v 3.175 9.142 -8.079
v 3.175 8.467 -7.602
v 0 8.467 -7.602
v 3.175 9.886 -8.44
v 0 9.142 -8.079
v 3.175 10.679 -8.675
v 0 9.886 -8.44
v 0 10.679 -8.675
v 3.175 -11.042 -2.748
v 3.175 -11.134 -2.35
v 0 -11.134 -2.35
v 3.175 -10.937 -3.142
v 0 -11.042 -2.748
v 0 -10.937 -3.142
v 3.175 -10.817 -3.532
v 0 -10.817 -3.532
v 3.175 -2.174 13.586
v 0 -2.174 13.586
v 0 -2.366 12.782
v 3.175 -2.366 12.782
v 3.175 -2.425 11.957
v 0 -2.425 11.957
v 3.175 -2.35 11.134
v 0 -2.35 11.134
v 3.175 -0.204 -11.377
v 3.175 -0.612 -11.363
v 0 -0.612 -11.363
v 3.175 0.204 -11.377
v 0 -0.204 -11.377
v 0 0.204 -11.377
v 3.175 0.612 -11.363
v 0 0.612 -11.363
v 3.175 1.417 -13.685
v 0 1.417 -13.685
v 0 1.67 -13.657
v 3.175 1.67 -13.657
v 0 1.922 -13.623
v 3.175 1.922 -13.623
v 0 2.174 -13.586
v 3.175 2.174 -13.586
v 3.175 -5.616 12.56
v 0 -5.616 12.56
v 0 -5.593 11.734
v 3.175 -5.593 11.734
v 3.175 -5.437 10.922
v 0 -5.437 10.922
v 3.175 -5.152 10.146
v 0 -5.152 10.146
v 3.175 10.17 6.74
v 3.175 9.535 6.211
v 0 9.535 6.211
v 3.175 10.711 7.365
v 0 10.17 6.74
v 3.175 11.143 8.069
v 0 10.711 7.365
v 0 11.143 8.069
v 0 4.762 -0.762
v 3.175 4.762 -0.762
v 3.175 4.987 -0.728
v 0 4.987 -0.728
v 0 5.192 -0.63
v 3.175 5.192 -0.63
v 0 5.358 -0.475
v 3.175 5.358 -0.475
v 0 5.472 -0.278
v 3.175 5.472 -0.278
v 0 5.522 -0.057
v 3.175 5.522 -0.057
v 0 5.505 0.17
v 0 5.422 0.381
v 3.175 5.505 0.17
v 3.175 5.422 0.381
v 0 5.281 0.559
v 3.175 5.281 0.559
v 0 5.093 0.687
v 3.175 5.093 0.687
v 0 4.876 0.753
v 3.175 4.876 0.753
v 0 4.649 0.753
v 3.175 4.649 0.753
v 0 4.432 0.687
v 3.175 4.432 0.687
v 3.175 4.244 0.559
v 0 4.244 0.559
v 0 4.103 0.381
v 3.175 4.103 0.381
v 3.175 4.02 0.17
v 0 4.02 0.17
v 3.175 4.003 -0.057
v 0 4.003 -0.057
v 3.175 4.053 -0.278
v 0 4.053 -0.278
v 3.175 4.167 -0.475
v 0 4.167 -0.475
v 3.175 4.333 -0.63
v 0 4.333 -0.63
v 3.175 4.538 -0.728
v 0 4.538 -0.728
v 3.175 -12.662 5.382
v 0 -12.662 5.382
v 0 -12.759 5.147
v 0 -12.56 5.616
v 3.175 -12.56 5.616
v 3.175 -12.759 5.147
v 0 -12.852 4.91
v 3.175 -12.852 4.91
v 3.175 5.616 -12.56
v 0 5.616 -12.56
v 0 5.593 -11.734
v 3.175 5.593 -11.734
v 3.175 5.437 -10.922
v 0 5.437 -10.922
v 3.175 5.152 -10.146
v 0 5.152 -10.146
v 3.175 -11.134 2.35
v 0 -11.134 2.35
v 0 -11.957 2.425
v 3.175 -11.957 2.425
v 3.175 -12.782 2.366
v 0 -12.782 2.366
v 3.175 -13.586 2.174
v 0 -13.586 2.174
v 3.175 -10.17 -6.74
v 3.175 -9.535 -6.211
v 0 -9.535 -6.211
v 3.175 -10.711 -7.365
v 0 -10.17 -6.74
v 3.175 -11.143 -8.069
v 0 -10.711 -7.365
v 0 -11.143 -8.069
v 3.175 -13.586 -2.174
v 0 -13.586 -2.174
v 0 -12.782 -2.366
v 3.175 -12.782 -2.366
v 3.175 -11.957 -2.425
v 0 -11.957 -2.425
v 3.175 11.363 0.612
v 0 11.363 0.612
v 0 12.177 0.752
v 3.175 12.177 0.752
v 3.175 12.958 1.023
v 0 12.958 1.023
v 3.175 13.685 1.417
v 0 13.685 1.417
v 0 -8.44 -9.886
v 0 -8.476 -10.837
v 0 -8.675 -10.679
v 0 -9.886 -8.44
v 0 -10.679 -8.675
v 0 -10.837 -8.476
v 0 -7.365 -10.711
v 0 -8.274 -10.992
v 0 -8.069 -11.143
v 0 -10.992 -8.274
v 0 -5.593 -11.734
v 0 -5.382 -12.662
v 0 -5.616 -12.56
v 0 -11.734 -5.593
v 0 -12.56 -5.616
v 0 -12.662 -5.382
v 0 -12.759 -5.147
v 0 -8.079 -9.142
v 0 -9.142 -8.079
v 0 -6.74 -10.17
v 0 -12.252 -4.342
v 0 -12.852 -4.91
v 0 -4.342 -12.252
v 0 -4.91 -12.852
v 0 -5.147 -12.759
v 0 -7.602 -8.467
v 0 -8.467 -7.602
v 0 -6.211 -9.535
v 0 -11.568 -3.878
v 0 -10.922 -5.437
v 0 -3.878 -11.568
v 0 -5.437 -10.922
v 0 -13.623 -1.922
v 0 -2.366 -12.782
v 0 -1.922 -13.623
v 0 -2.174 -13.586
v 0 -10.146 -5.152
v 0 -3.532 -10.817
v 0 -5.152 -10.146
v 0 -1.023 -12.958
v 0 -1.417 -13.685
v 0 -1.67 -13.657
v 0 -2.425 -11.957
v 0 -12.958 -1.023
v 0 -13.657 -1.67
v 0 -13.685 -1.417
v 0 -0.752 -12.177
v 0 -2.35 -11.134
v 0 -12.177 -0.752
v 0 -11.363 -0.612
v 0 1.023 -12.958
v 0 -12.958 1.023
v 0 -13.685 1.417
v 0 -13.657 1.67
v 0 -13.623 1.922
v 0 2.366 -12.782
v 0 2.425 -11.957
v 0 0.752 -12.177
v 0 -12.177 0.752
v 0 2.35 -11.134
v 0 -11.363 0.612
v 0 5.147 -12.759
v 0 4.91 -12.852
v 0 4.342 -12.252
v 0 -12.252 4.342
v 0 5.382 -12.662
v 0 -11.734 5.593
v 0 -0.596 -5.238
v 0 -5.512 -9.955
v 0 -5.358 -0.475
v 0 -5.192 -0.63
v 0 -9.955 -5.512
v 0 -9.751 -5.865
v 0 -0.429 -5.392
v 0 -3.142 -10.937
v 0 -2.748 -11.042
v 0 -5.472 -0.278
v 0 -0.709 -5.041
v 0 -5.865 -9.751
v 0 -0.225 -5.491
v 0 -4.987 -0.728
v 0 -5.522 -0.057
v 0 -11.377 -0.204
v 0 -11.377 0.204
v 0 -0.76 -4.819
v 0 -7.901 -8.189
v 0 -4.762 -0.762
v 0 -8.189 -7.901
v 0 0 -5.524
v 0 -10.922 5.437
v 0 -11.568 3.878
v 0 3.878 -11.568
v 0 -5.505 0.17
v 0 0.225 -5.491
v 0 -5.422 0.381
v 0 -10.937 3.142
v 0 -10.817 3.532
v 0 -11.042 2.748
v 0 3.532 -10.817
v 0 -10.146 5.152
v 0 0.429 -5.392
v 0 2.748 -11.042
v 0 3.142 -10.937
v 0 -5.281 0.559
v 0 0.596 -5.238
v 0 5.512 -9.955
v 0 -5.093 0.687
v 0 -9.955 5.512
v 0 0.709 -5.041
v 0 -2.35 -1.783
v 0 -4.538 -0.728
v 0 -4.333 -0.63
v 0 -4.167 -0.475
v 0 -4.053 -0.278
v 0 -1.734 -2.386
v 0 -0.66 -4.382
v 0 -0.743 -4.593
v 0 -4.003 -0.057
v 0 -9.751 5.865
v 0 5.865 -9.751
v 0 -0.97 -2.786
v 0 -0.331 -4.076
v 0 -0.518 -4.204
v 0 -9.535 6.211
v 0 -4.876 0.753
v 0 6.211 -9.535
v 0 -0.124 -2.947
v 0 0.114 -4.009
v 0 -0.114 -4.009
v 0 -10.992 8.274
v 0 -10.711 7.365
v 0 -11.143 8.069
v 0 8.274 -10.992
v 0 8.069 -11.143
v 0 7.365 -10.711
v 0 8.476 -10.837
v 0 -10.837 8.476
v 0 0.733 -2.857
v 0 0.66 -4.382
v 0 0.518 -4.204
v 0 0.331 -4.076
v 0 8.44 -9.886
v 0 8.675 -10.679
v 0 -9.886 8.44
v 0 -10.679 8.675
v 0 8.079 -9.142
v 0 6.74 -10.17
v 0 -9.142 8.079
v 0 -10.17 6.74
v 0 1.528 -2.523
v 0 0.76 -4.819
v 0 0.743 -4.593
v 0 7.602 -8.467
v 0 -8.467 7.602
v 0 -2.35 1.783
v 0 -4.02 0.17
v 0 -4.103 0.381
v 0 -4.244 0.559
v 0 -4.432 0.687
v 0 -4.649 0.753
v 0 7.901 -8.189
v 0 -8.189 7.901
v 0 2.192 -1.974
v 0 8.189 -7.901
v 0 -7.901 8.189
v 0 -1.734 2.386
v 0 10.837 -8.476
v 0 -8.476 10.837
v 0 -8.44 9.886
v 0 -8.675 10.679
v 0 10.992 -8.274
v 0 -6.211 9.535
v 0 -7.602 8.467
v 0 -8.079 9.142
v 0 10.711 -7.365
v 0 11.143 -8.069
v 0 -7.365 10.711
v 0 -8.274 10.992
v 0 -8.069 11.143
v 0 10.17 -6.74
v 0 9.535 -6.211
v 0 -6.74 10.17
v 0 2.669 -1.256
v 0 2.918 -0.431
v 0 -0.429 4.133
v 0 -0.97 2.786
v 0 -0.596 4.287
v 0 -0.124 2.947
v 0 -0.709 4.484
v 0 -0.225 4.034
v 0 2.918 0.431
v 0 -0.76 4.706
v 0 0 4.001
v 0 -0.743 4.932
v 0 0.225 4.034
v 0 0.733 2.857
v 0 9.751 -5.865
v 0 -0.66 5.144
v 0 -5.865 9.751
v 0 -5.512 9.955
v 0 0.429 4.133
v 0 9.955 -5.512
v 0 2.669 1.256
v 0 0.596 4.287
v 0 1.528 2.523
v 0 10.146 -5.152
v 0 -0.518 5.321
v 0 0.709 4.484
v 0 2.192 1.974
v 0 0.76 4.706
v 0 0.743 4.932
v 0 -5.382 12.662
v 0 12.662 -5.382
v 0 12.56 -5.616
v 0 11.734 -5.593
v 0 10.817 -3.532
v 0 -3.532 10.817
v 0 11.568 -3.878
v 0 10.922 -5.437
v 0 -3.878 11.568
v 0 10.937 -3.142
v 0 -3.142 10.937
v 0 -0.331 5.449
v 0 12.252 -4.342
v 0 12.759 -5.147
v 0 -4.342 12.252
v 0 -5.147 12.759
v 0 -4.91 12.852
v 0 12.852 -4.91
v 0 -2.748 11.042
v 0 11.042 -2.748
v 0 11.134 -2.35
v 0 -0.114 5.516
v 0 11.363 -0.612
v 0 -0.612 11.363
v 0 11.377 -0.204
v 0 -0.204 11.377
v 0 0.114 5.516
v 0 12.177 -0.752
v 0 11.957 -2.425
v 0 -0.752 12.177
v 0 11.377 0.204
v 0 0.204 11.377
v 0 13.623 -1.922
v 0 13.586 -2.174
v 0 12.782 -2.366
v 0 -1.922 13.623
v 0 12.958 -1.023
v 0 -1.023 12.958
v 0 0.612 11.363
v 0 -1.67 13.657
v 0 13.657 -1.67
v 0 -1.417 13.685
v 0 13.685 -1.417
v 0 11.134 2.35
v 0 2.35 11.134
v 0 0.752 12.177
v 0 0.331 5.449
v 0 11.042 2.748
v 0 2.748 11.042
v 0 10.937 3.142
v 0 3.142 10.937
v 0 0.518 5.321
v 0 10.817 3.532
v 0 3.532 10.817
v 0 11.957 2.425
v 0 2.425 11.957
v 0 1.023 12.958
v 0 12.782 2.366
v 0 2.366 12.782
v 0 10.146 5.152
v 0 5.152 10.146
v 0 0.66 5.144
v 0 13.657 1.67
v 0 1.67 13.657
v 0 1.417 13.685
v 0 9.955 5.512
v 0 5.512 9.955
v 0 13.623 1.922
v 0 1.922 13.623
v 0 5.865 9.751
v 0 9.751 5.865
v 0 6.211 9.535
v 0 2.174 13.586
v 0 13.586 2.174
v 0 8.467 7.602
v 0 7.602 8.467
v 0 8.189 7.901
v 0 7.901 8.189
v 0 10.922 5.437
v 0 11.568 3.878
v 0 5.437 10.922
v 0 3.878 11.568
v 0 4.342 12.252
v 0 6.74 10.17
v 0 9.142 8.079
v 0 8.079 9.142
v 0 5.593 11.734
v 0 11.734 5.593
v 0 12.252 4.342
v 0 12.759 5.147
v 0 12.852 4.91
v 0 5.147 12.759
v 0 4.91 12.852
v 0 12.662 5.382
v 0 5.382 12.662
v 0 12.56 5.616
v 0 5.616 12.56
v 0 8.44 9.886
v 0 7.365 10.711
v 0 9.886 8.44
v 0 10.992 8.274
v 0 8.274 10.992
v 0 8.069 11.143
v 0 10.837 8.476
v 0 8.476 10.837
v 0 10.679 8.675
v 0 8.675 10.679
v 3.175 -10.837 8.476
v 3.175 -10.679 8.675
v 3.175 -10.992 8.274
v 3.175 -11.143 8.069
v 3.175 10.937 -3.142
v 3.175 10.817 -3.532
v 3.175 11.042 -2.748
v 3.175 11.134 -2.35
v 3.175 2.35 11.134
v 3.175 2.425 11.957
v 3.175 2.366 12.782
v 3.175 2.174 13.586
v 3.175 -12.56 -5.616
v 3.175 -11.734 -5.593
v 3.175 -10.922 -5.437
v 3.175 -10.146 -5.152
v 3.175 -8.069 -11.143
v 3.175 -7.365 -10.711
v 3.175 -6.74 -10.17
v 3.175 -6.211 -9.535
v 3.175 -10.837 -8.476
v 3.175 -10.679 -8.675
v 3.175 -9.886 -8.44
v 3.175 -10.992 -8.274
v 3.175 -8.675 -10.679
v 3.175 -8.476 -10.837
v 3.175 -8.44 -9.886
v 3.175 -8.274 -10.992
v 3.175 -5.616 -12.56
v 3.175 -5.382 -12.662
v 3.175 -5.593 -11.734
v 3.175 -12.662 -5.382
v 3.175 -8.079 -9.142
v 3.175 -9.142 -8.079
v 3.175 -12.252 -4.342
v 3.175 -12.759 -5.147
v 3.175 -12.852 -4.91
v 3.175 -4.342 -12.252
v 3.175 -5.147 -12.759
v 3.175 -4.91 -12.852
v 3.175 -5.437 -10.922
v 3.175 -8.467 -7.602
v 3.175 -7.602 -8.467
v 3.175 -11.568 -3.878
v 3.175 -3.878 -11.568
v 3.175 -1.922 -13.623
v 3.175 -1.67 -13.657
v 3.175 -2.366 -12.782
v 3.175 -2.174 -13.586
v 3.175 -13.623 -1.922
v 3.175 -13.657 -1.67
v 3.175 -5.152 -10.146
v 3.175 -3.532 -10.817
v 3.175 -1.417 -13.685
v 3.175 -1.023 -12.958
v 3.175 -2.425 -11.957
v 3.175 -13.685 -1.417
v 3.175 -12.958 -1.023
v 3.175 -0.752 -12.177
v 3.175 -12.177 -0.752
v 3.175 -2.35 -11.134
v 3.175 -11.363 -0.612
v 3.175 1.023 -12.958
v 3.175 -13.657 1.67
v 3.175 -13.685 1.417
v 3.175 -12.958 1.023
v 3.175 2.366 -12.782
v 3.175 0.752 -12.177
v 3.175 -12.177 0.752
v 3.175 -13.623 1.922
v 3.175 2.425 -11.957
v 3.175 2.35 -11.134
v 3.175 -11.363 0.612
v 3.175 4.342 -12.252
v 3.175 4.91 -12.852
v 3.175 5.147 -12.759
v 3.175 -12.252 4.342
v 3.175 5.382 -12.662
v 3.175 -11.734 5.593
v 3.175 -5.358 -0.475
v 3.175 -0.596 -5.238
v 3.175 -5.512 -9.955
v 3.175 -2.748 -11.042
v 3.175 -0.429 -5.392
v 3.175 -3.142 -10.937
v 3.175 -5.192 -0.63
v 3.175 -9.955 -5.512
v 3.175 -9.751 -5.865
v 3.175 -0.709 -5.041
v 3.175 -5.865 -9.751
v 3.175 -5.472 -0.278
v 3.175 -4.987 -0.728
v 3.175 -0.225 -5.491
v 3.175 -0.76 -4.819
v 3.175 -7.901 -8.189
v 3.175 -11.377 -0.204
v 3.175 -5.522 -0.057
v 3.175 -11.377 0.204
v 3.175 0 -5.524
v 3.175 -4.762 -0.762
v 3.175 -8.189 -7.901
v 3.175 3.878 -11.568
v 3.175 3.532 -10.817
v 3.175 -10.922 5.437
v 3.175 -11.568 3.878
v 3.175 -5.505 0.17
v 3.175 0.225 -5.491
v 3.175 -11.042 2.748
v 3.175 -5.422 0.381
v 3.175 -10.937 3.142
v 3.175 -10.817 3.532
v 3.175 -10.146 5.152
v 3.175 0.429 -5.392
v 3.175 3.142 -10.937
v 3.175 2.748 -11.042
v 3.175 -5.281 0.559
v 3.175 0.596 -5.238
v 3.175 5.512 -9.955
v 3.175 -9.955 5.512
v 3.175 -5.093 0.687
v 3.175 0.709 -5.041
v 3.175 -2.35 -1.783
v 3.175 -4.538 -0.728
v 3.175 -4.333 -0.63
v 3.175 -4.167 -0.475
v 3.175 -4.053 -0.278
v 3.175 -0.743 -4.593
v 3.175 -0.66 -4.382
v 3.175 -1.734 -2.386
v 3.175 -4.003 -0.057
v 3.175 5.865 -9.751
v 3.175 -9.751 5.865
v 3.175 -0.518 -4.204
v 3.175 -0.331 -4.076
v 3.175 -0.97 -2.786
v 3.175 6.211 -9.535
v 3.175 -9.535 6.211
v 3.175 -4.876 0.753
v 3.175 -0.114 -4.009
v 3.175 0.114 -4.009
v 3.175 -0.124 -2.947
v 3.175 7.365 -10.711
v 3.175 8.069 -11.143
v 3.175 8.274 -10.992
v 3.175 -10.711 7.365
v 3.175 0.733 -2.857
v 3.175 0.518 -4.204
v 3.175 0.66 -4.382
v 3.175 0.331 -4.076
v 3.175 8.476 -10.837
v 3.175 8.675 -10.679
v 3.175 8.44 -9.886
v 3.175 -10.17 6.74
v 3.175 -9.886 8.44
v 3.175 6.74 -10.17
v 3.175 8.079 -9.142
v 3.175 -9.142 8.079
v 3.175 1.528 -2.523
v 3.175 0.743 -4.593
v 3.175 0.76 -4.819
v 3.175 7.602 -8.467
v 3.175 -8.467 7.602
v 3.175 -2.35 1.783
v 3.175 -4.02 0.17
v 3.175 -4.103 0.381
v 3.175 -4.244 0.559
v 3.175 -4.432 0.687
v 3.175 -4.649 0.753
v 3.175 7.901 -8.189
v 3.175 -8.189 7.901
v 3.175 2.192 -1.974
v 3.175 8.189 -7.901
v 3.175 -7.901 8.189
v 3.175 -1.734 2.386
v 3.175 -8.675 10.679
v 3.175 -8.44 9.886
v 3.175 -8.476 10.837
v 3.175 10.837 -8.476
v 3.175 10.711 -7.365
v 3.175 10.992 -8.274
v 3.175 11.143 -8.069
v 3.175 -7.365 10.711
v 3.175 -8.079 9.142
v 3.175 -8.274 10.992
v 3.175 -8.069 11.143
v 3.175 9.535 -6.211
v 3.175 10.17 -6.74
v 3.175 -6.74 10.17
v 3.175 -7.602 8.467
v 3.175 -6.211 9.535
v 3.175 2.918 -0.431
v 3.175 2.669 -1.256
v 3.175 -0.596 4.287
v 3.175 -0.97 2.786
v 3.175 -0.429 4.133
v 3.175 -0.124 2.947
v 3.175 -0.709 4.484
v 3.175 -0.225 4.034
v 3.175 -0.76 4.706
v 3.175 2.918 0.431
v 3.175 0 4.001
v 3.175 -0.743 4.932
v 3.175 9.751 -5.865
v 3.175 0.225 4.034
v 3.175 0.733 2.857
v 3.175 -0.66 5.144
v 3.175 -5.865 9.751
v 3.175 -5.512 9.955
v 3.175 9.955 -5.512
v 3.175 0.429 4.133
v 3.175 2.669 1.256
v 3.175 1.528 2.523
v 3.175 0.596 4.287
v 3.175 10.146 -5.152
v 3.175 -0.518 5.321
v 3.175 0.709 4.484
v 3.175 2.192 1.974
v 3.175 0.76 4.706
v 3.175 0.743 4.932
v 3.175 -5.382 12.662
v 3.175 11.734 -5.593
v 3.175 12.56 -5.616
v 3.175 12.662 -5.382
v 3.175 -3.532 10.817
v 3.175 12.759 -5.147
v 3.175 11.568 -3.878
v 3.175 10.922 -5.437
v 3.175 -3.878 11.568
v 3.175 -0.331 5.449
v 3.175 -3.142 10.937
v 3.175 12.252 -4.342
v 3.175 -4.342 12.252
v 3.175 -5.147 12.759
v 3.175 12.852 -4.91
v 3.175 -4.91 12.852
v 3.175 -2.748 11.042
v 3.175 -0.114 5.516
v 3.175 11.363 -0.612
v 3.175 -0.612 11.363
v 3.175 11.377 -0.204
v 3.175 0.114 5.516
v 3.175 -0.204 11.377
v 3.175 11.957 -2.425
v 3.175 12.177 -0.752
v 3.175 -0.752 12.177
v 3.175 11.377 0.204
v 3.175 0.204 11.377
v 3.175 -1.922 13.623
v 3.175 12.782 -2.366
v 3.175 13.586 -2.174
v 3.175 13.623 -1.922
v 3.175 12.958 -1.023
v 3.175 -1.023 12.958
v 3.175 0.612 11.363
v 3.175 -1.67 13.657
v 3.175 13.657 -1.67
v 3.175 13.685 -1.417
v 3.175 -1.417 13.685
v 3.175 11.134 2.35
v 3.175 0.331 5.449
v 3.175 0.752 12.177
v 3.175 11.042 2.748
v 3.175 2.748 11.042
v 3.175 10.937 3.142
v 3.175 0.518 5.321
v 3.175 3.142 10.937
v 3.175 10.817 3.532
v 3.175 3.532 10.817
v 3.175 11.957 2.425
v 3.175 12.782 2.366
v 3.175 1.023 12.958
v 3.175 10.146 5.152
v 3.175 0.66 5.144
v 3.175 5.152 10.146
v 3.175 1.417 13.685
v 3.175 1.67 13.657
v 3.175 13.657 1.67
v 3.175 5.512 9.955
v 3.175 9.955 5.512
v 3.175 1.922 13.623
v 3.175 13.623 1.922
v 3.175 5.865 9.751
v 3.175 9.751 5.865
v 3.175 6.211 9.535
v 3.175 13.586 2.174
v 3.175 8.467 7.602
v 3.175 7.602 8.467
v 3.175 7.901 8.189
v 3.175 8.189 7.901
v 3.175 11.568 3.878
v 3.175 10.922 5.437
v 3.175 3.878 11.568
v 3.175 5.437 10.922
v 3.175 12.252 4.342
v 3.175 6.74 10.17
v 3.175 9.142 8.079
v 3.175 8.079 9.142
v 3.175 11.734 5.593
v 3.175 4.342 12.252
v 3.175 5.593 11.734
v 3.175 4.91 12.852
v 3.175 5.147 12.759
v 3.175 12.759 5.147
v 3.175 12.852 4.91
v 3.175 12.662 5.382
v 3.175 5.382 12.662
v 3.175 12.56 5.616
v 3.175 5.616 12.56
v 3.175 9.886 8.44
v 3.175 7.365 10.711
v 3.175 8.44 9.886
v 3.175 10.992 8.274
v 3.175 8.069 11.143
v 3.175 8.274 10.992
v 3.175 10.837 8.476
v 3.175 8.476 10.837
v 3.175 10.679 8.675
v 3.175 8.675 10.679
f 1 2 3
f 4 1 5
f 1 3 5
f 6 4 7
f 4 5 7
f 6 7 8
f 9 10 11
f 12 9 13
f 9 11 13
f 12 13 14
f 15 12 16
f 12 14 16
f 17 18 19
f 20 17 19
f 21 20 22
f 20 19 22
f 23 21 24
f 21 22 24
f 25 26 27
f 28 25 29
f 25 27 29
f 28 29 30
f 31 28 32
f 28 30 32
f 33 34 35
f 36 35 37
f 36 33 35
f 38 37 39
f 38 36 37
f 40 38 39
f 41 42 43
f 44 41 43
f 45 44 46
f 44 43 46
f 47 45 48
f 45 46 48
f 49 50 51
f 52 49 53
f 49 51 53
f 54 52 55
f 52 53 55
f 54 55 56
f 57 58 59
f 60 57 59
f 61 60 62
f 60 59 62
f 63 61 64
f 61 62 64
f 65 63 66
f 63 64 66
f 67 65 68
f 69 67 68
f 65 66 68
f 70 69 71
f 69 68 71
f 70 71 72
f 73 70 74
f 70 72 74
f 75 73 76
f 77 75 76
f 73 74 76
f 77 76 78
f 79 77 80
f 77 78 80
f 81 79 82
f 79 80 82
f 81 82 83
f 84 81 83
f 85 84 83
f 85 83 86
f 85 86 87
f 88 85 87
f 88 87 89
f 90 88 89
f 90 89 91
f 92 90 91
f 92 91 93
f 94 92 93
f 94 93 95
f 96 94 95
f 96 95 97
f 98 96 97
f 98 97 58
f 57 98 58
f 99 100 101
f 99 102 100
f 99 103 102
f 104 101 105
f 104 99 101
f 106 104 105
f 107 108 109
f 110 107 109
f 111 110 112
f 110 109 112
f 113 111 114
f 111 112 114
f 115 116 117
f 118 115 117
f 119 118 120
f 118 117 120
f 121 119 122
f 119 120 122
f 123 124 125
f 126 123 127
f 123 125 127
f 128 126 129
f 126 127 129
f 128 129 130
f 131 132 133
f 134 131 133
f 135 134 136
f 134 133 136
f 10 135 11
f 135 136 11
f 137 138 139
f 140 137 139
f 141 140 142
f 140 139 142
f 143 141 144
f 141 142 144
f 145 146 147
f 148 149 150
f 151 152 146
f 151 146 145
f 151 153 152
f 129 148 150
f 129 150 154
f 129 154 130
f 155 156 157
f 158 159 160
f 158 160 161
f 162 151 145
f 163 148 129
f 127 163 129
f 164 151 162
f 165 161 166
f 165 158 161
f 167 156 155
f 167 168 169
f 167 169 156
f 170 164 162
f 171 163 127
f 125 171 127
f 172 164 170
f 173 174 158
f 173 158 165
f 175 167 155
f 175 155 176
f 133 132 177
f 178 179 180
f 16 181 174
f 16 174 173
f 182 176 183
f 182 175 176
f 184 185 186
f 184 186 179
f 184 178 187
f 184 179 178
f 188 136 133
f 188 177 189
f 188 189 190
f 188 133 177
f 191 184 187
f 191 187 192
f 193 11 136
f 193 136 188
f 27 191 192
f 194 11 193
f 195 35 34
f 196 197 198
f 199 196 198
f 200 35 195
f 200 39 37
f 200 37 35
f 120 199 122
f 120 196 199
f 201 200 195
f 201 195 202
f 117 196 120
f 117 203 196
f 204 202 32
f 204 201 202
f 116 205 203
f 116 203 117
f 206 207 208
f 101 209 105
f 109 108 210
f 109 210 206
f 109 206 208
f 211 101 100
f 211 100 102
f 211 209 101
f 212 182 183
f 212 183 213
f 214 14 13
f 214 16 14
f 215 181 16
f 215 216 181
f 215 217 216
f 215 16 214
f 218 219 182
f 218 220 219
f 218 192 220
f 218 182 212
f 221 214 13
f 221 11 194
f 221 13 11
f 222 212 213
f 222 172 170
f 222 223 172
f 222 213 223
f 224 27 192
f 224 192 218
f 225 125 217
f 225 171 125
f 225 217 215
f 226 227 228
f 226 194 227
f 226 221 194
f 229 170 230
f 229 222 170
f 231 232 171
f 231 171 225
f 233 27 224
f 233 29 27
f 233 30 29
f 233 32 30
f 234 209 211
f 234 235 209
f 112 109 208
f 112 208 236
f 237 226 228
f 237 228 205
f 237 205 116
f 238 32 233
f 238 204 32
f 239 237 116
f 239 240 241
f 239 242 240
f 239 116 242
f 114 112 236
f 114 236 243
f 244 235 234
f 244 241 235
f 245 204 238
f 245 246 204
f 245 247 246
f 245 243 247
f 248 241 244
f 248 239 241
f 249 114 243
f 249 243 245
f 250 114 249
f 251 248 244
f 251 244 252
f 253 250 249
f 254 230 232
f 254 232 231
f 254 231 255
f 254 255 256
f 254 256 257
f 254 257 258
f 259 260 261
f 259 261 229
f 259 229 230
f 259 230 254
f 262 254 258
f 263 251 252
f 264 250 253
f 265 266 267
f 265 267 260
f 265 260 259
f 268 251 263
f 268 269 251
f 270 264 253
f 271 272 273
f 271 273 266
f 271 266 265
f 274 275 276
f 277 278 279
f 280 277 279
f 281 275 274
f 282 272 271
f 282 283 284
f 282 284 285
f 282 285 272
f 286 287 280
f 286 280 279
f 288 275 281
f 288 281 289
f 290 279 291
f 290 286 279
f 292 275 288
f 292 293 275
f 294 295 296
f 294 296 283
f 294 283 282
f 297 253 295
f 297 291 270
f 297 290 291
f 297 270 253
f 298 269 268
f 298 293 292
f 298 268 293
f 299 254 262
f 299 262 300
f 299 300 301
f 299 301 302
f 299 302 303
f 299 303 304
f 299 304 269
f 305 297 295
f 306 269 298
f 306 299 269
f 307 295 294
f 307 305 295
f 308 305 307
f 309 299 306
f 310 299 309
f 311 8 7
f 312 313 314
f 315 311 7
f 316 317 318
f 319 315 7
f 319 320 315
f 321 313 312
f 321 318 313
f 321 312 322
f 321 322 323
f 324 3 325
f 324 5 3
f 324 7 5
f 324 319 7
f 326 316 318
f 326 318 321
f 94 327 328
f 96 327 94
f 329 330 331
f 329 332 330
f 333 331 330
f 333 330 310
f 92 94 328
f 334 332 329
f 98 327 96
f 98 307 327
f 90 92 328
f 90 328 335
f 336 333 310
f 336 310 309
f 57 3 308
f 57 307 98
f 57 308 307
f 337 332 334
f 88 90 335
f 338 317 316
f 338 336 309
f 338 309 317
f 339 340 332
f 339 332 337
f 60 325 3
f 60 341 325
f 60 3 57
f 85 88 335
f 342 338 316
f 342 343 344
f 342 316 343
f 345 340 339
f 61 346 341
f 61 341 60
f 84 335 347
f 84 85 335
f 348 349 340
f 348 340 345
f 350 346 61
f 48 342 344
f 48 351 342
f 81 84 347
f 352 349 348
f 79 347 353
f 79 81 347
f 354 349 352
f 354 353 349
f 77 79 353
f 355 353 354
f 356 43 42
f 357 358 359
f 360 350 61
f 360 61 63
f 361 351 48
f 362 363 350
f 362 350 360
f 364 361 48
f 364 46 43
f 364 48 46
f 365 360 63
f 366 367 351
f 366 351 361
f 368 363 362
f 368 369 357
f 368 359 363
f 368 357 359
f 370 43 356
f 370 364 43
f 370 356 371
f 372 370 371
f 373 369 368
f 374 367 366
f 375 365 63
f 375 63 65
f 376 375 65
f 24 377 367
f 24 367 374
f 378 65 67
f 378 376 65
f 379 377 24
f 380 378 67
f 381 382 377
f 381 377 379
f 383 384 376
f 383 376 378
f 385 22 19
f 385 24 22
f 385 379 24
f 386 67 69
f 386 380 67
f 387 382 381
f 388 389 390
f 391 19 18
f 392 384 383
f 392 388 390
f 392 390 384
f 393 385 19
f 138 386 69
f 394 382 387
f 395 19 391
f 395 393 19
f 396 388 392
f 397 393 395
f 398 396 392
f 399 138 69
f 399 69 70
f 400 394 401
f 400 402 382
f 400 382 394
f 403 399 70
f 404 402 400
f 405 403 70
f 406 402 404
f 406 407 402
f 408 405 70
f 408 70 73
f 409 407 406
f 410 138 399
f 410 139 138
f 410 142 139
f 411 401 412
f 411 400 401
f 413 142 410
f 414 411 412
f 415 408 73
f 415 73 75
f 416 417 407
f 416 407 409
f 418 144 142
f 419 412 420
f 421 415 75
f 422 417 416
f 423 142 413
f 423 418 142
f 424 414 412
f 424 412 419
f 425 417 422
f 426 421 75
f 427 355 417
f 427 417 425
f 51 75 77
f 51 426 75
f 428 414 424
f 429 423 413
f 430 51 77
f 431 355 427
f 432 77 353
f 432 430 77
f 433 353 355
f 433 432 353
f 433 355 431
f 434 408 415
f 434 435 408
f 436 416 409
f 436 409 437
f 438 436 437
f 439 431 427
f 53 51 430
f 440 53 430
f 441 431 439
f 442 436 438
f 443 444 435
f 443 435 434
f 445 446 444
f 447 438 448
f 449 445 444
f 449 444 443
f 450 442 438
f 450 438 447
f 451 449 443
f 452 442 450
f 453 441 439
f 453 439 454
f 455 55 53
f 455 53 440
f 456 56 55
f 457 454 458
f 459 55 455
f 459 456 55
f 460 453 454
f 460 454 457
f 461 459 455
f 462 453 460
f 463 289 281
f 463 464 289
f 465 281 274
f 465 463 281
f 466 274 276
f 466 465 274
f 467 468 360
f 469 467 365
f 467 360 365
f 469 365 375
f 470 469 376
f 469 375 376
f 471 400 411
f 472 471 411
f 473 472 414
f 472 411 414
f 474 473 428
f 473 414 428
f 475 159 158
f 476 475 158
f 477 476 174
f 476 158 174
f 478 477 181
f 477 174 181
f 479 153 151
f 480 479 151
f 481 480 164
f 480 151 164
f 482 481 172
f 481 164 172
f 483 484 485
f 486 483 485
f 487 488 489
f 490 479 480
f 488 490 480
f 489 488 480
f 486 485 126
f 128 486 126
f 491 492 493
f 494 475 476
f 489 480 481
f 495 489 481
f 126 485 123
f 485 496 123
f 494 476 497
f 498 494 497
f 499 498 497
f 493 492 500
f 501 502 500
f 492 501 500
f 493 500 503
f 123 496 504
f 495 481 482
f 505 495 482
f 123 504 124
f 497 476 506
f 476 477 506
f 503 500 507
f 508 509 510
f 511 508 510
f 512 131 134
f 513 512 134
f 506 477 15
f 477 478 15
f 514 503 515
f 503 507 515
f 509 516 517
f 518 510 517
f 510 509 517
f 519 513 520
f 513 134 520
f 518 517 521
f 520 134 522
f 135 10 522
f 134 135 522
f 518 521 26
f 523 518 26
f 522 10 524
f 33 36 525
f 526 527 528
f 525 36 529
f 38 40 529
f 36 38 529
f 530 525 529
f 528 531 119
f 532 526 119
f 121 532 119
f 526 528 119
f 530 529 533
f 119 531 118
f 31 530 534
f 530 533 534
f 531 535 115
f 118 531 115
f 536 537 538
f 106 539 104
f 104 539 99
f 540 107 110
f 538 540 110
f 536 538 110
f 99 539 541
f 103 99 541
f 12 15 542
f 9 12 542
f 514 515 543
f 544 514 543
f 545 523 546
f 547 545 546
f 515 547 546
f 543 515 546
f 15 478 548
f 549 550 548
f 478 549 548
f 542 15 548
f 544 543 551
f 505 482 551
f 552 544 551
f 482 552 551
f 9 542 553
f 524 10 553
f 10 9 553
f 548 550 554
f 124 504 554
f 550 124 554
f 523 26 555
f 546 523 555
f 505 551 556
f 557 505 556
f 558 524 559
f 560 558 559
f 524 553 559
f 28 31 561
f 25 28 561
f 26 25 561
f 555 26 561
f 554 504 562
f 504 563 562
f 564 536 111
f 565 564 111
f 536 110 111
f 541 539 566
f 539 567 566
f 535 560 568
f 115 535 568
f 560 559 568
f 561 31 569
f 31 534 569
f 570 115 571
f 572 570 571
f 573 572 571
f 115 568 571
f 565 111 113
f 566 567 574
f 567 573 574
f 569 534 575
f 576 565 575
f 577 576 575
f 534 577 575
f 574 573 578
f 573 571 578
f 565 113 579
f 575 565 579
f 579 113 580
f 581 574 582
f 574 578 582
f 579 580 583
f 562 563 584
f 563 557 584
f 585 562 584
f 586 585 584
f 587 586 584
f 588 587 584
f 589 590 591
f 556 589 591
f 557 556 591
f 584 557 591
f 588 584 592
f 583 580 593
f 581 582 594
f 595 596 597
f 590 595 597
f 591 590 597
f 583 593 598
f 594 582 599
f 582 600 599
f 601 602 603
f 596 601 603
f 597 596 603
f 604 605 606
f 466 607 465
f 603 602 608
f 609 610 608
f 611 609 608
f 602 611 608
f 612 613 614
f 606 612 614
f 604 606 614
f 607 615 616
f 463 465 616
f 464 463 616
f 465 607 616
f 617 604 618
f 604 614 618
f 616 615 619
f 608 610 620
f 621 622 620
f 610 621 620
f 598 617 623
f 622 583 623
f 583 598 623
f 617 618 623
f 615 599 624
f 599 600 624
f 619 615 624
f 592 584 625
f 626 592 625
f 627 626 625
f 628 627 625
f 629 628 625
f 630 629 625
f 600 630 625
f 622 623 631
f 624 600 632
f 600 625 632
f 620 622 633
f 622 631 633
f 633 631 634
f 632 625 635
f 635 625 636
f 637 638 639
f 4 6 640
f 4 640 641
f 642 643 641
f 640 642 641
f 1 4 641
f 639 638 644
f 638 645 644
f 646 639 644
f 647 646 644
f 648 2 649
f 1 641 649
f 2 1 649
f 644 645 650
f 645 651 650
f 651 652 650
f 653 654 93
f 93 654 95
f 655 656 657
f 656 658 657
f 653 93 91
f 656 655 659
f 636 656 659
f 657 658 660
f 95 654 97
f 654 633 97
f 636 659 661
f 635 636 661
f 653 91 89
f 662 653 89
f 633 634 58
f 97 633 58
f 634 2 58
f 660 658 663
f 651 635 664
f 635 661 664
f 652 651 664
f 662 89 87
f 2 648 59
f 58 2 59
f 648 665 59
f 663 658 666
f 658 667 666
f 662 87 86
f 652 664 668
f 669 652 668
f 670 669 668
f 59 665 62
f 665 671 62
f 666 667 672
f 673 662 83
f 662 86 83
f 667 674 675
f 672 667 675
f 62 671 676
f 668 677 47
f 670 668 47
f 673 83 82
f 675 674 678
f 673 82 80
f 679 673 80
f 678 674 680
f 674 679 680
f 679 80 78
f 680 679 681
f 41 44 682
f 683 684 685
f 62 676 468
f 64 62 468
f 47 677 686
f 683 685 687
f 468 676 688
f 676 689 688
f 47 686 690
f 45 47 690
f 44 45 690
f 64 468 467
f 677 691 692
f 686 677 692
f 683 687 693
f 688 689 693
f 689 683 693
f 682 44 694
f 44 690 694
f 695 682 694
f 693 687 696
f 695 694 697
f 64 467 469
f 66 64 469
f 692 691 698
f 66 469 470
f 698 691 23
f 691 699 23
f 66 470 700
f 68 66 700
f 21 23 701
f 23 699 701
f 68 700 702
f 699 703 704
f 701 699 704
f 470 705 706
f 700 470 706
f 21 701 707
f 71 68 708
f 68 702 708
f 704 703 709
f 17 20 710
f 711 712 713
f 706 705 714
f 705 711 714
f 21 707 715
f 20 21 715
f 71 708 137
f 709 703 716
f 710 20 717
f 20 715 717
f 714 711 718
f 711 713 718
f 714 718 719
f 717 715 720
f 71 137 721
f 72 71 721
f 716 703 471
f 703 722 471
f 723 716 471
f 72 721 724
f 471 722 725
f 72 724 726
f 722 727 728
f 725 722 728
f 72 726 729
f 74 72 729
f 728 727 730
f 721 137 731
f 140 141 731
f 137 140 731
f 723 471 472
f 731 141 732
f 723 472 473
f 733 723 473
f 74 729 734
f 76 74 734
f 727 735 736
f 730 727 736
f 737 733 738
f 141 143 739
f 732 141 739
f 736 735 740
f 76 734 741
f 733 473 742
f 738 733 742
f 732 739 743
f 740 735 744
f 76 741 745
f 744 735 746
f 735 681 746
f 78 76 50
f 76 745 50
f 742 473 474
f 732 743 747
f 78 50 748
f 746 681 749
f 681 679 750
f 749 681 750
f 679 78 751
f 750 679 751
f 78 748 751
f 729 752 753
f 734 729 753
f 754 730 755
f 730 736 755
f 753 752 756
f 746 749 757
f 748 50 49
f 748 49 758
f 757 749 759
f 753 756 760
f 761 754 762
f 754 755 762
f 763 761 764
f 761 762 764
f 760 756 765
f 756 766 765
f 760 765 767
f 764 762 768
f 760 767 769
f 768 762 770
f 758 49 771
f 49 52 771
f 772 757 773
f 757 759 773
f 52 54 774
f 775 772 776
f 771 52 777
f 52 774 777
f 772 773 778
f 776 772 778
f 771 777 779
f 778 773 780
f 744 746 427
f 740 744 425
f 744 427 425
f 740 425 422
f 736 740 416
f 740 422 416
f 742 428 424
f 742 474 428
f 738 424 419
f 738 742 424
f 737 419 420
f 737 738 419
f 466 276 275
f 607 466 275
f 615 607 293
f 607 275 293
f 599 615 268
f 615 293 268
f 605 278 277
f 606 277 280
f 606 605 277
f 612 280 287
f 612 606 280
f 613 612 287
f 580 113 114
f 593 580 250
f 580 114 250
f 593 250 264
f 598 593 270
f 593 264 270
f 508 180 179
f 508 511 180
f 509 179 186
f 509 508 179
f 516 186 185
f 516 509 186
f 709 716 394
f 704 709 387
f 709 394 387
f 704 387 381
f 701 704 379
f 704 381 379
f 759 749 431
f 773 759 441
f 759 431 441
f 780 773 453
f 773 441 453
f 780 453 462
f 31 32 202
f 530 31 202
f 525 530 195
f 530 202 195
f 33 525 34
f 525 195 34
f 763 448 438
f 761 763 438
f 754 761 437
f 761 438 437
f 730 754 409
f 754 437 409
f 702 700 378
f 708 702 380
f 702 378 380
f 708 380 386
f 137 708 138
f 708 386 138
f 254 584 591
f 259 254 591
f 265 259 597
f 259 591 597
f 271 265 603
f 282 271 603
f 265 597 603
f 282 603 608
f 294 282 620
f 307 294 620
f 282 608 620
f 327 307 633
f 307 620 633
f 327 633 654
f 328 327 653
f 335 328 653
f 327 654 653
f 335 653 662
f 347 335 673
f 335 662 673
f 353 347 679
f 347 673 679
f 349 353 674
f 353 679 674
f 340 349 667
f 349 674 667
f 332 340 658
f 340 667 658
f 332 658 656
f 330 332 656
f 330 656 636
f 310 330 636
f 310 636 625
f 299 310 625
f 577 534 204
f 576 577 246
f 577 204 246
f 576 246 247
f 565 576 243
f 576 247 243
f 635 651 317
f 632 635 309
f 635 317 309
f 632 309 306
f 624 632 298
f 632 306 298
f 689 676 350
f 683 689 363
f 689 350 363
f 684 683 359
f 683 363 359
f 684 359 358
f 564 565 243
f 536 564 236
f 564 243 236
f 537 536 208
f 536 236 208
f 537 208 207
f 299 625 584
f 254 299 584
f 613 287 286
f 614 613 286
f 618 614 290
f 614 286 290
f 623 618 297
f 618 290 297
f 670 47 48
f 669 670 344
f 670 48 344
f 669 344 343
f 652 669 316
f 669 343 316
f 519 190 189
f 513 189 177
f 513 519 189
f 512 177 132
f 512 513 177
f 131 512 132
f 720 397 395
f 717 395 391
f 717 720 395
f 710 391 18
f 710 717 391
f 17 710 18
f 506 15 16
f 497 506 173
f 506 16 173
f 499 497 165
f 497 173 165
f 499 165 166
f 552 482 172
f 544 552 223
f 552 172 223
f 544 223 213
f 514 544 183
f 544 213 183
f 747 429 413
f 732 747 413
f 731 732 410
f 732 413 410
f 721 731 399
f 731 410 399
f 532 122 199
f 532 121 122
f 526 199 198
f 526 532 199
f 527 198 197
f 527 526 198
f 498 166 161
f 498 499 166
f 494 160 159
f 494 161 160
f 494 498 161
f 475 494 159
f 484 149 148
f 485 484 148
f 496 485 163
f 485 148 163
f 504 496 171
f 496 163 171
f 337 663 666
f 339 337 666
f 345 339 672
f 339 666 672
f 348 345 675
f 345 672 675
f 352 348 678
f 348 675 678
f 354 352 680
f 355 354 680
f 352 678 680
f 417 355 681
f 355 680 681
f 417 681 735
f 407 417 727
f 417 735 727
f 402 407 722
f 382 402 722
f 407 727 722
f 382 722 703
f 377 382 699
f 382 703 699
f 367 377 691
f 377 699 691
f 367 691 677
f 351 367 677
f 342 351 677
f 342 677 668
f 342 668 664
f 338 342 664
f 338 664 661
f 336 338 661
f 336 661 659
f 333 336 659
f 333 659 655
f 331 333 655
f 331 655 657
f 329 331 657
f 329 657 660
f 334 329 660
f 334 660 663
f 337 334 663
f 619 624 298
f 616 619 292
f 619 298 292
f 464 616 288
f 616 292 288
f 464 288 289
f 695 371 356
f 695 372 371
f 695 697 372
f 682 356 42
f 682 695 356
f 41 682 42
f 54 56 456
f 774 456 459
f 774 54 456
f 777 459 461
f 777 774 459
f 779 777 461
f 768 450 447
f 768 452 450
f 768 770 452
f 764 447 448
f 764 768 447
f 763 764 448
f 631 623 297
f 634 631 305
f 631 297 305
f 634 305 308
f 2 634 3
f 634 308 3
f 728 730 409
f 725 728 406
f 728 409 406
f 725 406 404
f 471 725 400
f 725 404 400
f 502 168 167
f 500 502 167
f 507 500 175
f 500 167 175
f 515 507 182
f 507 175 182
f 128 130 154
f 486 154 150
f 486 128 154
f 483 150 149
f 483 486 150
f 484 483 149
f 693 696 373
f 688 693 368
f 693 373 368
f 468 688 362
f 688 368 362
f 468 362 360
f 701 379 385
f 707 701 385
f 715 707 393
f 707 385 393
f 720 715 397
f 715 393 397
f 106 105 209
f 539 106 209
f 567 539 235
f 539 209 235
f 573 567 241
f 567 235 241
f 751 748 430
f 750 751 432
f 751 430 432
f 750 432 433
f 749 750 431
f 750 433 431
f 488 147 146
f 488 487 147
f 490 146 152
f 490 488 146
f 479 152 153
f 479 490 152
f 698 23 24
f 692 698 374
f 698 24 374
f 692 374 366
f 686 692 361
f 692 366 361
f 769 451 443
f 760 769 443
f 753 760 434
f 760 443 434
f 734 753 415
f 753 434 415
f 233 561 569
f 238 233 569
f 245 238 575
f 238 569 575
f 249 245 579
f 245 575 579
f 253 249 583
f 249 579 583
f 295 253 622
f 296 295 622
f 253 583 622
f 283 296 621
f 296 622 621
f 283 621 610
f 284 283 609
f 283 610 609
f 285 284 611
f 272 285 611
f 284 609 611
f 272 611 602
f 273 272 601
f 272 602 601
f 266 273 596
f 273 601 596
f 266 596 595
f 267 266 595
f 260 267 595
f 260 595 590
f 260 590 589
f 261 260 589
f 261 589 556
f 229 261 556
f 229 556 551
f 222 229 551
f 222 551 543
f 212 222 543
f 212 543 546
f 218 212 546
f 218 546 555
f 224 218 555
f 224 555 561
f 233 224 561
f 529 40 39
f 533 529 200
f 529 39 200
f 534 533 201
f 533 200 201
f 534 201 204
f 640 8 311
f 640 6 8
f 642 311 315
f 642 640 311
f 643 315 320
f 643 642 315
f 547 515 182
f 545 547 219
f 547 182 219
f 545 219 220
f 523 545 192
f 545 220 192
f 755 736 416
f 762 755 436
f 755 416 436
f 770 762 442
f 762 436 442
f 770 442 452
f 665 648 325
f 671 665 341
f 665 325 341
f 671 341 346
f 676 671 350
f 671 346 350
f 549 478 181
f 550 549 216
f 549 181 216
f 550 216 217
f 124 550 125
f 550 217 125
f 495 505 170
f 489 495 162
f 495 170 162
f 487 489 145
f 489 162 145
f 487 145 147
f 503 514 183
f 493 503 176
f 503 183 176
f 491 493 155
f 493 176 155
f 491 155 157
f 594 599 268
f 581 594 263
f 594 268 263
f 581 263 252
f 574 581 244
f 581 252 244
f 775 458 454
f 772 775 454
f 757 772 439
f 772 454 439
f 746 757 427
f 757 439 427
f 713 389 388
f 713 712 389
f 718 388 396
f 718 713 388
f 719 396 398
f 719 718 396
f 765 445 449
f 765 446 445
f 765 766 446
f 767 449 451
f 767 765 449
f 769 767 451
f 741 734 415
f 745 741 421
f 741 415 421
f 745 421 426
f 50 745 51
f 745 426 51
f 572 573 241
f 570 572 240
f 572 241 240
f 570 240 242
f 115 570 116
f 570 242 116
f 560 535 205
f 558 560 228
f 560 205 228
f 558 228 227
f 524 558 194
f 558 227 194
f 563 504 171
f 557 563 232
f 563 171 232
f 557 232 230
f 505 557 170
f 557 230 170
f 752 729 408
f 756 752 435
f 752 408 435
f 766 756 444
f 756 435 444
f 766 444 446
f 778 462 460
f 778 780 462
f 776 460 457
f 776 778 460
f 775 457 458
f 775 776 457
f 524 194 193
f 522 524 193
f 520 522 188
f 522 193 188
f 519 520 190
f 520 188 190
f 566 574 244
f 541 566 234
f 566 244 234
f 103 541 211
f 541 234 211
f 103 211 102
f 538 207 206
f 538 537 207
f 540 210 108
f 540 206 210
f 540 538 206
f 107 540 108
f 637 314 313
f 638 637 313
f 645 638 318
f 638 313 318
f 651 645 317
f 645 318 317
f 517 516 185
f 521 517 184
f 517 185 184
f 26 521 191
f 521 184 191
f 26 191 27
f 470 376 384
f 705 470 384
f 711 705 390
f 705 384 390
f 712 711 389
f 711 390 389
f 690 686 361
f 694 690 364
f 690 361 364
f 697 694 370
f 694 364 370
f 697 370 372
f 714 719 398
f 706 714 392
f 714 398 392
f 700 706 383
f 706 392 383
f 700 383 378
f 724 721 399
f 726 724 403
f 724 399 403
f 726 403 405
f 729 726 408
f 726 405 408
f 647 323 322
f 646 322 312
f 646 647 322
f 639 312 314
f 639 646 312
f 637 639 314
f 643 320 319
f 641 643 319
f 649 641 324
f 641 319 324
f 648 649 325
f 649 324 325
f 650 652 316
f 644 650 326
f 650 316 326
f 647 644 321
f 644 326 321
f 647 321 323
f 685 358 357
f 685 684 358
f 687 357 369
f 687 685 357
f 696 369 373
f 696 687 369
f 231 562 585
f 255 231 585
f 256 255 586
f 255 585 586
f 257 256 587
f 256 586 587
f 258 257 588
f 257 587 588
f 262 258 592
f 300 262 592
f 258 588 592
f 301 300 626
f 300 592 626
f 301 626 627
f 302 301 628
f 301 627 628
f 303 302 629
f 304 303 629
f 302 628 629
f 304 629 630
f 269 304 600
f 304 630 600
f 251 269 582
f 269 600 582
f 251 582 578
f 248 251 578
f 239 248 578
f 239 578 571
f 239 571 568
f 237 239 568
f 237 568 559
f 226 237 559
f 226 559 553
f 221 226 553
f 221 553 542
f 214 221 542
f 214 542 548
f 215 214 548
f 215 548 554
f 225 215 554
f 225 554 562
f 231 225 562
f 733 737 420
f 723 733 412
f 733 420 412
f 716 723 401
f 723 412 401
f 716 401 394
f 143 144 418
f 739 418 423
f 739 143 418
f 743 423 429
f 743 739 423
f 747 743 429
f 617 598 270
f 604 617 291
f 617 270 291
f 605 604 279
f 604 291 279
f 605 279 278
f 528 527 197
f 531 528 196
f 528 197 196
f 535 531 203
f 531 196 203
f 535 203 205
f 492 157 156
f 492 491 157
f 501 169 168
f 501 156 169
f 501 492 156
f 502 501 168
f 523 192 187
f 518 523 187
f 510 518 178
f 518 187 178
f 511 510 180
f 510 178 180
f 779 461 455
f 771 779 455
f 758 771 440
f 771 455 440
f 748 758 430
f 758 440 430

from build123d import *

# Parameters (mm, degrees)
BASPROSKE_W        = 3.175
BASPROSKE_H        = 13.758333333
TOOTHCUT_DEPTH     = 4.175
TEETHCUTS_COUNT    = 24
TEETHCUTS_ANGLE    = 345
CUT_EXTRUDE1_REACH = 5.175
CUT_EXTRUDE2_REACH = 5.175
SKETCH3_R          = 0.762


with BuildPart() as part:
    # BasProSke → Base-Revolve (revolve)
    with BuildSketch(Plane(origin=(0, 0, 0), x_dir=(1, 0, 0), z_dir=(0, 1, 0))):
        with Locations((1.5875, 6.879166667)):
            Rectangle(BASPROSKE_W, BASPROSKE_H)
    revolve(axis=Axis((-10, 0, 0), (1, 0, 0)))

    # TooCutSke → ToothCut (cut, through all)
    with BuildSketch(Plane(origin=(0, 0, 0), x_dir=(0, 0, -1), z_dir=(1, 0, 0))):
        with BuildLine():
            ThreePointArc((0.61154538, 11.362755163), (0, 11.3792), (-0.61154538, 11.362755163))
            ThreePointArc((-0.61154538, 11.362755163), (-0.876237748, 12.586912754), (-1.432393192, 13.709104797))
            ThreePointArc((-1.432393192, 13.709104797), (0, 13.783733333), (1.432393192, 13.709104797))
            ThreePointArc((1.432393192, 13.709104797), (0.876237748, 12.586912754), (0.61154538, 11.362755163))
        make_face()
    toothcut = extrude(amount=TOOTHCUT_DEPTH, mode=Mode.SUBTRACT)

    # TeethCuts: ToothCut ×24 about axis
    teethcuts_axis = Axis((-10, 0, 0), (1, 0, 0))
    for i in range(1, TEETHCUTS_COUNT):
        add(toothcut.rotate(teethcuts_axis, i * TEETHCUTS_ANGLE / (TEETHCUTS_COUNT - 1)), mode=Mode.SUBTRACT)

    # Sketch1 → Cut-Extrude1 (cut, up to next)
    with BuildSketch(Plane(origin=(3.175, 0, 0), x_dir=(0, 0, -1), z_dir=(1, 0, 0)), mode=Mode.PRIVATE) as cut_extrude1_sk1:
        with BuildLine():
            Line((-1.78325545, -2.35), (1.78325545, -2.35))
            ThreePointArc((1.78325545, -2.35), (0, 2.95), (-1.78325545, -2.35))
        make_face()
    cut_extrude1_tool1 = extrude(cut_extrude1_sk1.sketch, amount=-CUT_EXTRUDE1_REACH, mode=Mode.PRIVATE) & part.part
    add(cut_extrude1_tool1.solids().sort_by_distance((3.175, 0.146071, 0))[0], mode=Mode.SUBTRACT)

    # Sketch3 → Cut-Extrude2 (cut, up to next)
    with BuildSketch(Plane(origin=(3.175, 0, 0), x_dir=(0, 0, -1), z_dir=(1, 0, 0)), mode=Mode.PRIVATE) as cut_extrude2_sk1:
        with Locations((0, 4.7625)):
            Circle(SKETCH3_R)
    cut_extrude2_tool1 = extrude(cut_extrude2_sk1.sketch, amount=-CUT_EXTRUDE2_REACH, mode=Mode.PRIVATE) & part.part
    add(cut_extrude2_tool1.solids().sort_by_distance((3.175, 4.7625, 0))[0], mode=Mode.SUBTRACT)
    # Sketch3 → Cut-Extrude2 (cut, up to next)
    with BuildSketch(Plane(origin=(3.175, 0, 0), x_dir=(0, 0, -1), z_dir=(1, 0, 0)), mode=Mode.PRIVATE) as cut_extrude2_sk2:
        with Locations((-4.7625, 0)):
            Circle(SKETCH3_R)
    cut_extrude2_tool2 = extrude(cut_extrude2_sk2.sketch, amount=-CUT_EXTRUDE2_REACH, mode=Mode.PRIVATE) & part.part
    add(cut_extrude2_tool2.solids().sort_by_distance((3.175, 0, 4.7625))[0], mode=Mode.SUBTRACT)
    # Sketch3 → Cut-Extrude2 (cut, up to next)
    with BuildSketch(Plane(origin=(3.175, 0, 0), x_dir=(0, 0, -1), z_dir=(1, 0, 0)), mode=Mode.PRIVATE) as cut_extrude2_sk3:
        with Locations((4.7625, 0)):
            Circle(SKETCH3_R)
    cut_extrude2_tool3 = extrude(cut_extrude2_sk3.sketch, amount=-CUT_EXTRUDE2_REACH, mode=Mode.PRIVATE) & part.part
    add(cut_extrude2_tool3.solids().sort_by_distance((3.175, 0, -4.7625))[0], mode=Mode.SUBTRACT)
    # Sketch3 → Cut-Extrude2 (cut, up to next)
    with BuildSketch(Plane(origin=(3.175, 0, 0), x_dir=(0, 0, -1), z_dir=(1, 0, 0)), mode=Mode.PRIVATE) as cut_extrude2_sk4:
        with Locations((0, -4.7625)):
            Circle(SKETCH3_R)
    cut_extrude2_tool4 = extrude(cut_extrude2_sk4.sketch, amount=-CUT_EXTRUDE2_REACH, mode=Mode.PRIVATE) & part.part
    add(cut_extrude2_tool4.solids().sort_by_distance((3.175, -4.7625, 0))[0], mode=Mode.SUBTRACT)


solid = part.part
